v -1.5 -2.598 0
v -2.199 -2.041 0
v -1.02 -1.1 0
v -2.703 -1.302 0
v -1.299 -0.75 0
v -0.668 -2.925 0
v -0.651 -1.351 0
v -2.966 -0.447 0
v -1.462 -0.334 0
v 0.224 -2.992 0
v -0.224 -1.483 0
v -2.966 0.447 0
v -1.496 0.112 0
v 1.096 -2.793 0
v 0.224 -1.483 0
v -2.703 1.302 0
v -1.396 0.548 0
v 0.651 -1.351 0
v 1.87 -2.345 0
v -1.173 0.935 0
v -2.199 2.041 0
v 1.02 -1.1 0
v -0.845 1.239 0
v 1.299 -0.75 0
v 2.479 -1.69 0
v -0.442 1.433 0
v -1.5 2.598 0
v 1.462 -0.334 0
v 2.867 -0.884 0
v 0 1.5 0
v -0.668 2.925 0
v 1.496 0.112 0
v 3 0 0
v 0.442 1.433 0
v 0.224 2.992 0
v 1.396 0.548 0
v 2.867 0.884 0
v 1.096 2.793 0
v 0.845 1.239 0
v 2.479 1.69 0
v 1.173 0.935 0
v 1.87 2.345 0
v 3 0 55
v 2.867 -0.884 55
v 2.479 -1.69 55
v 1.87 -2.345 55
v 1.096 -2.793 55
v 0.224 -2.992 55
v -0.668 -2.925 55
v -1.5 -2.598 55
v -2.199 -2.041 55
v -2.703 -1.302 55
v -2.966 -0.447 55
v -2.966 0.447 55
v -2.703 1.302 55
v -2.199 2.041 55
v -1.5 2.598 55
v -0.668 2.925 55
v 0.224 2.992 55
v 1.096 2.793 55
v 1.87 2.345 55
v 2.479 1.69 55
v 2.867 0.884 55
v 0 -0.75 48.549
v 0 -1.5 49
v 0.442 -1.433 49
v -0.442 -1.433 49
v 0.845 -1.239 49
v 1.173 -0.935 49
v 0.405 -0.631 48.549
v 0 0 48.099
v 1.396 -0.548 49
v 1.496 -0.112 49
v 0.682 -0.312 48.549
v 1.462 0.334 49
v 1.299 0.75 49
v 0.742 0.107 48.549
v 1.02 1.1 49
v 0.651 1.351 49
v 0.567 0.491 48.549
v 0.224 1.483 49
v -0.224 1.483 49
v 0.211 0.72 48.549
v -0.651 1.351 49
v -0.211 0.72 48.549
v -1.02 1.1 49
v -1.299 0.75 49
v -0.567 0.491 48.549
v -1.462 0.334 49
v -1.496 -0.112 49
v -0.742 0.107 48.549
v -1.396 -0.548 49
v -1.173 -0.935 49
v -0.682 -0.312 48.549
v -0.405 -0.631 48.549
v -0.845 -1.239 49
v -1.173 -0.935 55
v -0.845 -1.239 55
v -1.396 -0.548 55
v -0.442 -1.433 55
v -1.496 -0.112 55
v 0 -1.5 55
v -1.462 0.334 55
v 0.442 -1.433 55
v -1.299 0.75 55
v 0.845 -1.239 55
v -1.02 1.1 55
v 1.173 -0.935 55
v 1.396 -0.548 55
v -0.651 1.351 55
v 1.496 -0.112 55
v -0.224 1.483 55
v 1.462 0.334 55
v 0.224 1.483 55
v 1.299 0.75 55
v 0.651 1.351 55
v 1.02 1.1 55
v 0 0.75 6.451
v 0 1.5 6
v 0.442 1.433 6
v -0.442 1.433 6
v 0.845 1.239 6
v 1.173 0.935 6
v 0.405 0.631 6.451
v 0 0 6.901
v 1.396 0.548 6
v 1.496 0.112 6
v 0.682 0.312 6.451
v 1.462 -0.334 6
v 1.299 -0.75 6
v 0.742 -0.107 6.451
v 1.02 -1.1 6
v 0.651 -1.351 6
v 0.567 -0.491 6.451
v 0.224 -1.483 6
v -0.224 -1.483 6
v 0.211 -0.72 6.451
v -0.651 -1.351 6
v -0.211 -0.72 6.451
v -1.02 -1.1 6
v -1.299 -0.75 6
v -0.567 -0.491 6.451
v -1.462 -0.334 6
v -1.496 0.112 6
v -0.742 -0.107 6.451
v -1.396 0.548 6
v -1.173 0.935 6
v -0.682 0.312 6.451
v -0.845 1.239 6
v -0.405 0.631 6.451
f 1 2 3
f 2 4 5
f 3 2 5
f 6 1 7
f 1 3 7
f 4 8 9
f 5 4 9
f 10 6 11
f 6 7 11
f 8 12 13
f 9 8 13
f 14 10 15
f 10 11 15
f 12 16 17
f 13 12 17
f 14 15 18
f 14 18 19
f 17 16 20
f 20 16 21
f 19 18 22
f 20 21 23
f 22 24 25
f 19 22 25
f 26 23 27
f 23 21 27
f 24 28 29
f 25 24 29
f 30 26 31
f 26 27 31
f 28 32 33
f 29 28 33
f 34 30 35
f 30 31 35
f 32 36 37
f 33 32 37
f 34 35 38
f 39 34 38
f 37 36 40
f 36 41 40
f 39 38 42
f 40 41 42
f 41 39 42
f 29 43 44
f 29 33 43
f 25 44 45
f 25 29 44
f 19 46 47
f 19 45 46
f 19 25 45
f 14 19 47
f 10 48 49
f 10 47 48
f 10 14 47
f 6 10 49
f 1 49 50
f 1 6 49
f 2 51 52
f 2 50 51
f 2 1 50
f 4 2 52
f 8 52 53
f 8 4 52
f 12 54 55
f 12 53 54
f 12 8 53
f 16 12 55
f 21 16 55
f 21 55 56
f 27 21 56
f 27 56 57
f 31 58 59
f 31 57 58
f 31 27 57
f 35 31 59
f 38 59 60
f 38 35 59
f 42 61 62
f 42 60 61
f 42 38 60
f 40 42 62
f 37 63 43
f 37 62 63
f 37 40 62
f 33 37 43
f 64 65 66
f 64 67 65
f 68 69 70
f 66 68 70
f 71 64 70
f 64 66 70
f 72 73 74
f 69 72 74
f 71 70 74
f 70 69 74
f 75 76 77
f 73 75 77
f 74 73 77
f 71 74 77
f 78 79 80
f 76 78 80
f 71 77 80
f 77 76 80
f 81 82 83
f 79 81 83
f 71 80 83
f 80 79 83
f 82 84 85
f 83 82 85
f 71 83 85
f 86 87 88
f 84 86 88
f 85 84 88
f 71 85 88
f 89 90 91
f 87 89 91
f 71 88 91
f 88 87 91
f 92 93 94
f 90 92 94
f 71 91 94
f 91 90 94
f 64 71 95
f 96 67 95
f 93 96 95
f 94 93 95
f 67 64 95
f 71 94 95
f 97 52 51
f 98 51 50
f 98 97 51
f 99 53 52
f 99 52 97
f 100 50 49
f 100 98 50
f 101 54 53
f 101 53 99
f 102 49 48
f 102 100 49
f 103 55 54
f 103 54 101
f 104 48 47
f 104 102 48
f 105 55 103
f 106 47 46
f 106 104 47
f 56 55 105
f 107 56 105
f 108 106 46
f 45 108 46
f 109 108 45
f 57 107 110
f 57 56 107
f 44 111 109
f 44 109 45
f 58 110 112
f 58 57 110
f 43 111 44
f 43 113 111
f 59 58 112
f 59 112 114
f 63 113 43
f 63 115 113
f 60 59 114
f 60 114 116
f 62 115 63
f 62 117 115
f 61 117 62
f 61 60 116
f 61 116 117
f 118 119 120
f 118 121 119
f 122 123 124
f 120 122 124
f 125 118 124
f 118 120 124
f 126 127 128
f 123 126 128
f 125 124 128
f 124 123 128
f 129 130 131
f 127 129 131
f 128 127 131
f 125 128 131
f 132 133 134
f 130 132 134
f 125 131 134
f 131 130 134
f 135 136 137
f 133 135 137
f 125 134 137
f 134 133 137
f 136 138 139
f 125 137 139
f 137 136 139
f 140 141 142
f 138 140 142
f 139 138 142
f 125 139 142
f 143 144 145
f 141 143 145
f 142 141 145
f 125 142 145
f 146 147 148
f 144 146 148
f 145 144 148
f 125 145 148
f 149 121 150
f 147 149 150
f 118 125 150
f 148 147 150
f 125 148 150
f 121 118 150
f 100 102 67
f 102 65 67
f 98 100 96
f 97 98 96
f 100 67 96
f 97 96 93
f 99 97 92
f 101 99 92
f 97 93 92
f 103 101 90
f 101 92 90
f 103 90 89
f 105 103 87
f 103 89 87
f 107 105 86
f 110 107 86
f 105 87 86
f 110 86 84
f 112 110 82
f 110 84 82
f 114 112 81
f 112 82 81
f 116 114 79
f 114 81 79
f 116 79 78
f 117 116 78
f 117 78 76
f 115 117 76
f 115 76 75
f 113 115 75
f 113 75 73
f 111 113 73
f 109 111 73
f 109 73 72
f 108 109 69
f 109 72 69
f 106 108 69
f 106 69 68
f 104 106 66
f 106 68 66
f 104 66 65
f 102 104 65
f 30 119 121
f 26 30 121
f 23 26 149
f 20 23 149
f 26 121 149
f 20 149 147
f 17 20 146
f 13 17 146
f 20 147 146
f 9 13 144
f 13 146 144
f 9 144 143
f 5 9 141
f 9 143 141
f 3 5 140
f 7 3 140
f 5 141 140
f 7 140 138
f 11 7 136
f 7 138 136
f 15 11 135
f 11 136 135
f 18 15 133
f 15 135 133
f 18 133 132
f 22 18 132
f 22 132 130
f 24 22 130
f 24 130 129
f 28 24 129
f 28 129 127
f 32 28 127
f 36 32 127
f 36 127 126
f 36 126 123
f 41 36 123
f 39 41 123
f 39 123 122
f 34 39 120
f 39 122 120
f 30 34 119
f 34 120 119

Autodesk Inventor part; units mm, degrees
ref_plane "YZ Plane" through (0, 0, 0) normal (1, 0, 0) x (0, 1, 0)
ref_plane "XZ Plane" through (0, 0, 0) normal (0, 1, 0) x (-1, 0, 0)
ref_plane "XY Plane" through (0, 0, 0) normal (0, 0, 1) x (1, 0, 0)
sketch "スケッチ1" plane through (0, 0, 0) normal (0, 0, 1) x (1, 0, 0)
  circle A0 centre (0, 0) radius 3
  dimension "d0" = 6
extrude "押し出し1" add sketch "スケッチ1" along normal blind 55
hole "穴1" at (0, 0, 0) direction (0, 0, 1) diameter 3 depth 6 tip angle 118
sketch "スケッチ2" plane through (0, 0, 55) normal (0, 0, 1) x (1, 0, 0)
  circle A0 centre (0, 0) radius 3 projected
hole "穴2" at (0, 0, 55) direction (0, 0, -1) diameter 3 depth 6 tip angle 118
properties part number "スペーサ　m3-l55" material "アルミニウム 2014-T4"
